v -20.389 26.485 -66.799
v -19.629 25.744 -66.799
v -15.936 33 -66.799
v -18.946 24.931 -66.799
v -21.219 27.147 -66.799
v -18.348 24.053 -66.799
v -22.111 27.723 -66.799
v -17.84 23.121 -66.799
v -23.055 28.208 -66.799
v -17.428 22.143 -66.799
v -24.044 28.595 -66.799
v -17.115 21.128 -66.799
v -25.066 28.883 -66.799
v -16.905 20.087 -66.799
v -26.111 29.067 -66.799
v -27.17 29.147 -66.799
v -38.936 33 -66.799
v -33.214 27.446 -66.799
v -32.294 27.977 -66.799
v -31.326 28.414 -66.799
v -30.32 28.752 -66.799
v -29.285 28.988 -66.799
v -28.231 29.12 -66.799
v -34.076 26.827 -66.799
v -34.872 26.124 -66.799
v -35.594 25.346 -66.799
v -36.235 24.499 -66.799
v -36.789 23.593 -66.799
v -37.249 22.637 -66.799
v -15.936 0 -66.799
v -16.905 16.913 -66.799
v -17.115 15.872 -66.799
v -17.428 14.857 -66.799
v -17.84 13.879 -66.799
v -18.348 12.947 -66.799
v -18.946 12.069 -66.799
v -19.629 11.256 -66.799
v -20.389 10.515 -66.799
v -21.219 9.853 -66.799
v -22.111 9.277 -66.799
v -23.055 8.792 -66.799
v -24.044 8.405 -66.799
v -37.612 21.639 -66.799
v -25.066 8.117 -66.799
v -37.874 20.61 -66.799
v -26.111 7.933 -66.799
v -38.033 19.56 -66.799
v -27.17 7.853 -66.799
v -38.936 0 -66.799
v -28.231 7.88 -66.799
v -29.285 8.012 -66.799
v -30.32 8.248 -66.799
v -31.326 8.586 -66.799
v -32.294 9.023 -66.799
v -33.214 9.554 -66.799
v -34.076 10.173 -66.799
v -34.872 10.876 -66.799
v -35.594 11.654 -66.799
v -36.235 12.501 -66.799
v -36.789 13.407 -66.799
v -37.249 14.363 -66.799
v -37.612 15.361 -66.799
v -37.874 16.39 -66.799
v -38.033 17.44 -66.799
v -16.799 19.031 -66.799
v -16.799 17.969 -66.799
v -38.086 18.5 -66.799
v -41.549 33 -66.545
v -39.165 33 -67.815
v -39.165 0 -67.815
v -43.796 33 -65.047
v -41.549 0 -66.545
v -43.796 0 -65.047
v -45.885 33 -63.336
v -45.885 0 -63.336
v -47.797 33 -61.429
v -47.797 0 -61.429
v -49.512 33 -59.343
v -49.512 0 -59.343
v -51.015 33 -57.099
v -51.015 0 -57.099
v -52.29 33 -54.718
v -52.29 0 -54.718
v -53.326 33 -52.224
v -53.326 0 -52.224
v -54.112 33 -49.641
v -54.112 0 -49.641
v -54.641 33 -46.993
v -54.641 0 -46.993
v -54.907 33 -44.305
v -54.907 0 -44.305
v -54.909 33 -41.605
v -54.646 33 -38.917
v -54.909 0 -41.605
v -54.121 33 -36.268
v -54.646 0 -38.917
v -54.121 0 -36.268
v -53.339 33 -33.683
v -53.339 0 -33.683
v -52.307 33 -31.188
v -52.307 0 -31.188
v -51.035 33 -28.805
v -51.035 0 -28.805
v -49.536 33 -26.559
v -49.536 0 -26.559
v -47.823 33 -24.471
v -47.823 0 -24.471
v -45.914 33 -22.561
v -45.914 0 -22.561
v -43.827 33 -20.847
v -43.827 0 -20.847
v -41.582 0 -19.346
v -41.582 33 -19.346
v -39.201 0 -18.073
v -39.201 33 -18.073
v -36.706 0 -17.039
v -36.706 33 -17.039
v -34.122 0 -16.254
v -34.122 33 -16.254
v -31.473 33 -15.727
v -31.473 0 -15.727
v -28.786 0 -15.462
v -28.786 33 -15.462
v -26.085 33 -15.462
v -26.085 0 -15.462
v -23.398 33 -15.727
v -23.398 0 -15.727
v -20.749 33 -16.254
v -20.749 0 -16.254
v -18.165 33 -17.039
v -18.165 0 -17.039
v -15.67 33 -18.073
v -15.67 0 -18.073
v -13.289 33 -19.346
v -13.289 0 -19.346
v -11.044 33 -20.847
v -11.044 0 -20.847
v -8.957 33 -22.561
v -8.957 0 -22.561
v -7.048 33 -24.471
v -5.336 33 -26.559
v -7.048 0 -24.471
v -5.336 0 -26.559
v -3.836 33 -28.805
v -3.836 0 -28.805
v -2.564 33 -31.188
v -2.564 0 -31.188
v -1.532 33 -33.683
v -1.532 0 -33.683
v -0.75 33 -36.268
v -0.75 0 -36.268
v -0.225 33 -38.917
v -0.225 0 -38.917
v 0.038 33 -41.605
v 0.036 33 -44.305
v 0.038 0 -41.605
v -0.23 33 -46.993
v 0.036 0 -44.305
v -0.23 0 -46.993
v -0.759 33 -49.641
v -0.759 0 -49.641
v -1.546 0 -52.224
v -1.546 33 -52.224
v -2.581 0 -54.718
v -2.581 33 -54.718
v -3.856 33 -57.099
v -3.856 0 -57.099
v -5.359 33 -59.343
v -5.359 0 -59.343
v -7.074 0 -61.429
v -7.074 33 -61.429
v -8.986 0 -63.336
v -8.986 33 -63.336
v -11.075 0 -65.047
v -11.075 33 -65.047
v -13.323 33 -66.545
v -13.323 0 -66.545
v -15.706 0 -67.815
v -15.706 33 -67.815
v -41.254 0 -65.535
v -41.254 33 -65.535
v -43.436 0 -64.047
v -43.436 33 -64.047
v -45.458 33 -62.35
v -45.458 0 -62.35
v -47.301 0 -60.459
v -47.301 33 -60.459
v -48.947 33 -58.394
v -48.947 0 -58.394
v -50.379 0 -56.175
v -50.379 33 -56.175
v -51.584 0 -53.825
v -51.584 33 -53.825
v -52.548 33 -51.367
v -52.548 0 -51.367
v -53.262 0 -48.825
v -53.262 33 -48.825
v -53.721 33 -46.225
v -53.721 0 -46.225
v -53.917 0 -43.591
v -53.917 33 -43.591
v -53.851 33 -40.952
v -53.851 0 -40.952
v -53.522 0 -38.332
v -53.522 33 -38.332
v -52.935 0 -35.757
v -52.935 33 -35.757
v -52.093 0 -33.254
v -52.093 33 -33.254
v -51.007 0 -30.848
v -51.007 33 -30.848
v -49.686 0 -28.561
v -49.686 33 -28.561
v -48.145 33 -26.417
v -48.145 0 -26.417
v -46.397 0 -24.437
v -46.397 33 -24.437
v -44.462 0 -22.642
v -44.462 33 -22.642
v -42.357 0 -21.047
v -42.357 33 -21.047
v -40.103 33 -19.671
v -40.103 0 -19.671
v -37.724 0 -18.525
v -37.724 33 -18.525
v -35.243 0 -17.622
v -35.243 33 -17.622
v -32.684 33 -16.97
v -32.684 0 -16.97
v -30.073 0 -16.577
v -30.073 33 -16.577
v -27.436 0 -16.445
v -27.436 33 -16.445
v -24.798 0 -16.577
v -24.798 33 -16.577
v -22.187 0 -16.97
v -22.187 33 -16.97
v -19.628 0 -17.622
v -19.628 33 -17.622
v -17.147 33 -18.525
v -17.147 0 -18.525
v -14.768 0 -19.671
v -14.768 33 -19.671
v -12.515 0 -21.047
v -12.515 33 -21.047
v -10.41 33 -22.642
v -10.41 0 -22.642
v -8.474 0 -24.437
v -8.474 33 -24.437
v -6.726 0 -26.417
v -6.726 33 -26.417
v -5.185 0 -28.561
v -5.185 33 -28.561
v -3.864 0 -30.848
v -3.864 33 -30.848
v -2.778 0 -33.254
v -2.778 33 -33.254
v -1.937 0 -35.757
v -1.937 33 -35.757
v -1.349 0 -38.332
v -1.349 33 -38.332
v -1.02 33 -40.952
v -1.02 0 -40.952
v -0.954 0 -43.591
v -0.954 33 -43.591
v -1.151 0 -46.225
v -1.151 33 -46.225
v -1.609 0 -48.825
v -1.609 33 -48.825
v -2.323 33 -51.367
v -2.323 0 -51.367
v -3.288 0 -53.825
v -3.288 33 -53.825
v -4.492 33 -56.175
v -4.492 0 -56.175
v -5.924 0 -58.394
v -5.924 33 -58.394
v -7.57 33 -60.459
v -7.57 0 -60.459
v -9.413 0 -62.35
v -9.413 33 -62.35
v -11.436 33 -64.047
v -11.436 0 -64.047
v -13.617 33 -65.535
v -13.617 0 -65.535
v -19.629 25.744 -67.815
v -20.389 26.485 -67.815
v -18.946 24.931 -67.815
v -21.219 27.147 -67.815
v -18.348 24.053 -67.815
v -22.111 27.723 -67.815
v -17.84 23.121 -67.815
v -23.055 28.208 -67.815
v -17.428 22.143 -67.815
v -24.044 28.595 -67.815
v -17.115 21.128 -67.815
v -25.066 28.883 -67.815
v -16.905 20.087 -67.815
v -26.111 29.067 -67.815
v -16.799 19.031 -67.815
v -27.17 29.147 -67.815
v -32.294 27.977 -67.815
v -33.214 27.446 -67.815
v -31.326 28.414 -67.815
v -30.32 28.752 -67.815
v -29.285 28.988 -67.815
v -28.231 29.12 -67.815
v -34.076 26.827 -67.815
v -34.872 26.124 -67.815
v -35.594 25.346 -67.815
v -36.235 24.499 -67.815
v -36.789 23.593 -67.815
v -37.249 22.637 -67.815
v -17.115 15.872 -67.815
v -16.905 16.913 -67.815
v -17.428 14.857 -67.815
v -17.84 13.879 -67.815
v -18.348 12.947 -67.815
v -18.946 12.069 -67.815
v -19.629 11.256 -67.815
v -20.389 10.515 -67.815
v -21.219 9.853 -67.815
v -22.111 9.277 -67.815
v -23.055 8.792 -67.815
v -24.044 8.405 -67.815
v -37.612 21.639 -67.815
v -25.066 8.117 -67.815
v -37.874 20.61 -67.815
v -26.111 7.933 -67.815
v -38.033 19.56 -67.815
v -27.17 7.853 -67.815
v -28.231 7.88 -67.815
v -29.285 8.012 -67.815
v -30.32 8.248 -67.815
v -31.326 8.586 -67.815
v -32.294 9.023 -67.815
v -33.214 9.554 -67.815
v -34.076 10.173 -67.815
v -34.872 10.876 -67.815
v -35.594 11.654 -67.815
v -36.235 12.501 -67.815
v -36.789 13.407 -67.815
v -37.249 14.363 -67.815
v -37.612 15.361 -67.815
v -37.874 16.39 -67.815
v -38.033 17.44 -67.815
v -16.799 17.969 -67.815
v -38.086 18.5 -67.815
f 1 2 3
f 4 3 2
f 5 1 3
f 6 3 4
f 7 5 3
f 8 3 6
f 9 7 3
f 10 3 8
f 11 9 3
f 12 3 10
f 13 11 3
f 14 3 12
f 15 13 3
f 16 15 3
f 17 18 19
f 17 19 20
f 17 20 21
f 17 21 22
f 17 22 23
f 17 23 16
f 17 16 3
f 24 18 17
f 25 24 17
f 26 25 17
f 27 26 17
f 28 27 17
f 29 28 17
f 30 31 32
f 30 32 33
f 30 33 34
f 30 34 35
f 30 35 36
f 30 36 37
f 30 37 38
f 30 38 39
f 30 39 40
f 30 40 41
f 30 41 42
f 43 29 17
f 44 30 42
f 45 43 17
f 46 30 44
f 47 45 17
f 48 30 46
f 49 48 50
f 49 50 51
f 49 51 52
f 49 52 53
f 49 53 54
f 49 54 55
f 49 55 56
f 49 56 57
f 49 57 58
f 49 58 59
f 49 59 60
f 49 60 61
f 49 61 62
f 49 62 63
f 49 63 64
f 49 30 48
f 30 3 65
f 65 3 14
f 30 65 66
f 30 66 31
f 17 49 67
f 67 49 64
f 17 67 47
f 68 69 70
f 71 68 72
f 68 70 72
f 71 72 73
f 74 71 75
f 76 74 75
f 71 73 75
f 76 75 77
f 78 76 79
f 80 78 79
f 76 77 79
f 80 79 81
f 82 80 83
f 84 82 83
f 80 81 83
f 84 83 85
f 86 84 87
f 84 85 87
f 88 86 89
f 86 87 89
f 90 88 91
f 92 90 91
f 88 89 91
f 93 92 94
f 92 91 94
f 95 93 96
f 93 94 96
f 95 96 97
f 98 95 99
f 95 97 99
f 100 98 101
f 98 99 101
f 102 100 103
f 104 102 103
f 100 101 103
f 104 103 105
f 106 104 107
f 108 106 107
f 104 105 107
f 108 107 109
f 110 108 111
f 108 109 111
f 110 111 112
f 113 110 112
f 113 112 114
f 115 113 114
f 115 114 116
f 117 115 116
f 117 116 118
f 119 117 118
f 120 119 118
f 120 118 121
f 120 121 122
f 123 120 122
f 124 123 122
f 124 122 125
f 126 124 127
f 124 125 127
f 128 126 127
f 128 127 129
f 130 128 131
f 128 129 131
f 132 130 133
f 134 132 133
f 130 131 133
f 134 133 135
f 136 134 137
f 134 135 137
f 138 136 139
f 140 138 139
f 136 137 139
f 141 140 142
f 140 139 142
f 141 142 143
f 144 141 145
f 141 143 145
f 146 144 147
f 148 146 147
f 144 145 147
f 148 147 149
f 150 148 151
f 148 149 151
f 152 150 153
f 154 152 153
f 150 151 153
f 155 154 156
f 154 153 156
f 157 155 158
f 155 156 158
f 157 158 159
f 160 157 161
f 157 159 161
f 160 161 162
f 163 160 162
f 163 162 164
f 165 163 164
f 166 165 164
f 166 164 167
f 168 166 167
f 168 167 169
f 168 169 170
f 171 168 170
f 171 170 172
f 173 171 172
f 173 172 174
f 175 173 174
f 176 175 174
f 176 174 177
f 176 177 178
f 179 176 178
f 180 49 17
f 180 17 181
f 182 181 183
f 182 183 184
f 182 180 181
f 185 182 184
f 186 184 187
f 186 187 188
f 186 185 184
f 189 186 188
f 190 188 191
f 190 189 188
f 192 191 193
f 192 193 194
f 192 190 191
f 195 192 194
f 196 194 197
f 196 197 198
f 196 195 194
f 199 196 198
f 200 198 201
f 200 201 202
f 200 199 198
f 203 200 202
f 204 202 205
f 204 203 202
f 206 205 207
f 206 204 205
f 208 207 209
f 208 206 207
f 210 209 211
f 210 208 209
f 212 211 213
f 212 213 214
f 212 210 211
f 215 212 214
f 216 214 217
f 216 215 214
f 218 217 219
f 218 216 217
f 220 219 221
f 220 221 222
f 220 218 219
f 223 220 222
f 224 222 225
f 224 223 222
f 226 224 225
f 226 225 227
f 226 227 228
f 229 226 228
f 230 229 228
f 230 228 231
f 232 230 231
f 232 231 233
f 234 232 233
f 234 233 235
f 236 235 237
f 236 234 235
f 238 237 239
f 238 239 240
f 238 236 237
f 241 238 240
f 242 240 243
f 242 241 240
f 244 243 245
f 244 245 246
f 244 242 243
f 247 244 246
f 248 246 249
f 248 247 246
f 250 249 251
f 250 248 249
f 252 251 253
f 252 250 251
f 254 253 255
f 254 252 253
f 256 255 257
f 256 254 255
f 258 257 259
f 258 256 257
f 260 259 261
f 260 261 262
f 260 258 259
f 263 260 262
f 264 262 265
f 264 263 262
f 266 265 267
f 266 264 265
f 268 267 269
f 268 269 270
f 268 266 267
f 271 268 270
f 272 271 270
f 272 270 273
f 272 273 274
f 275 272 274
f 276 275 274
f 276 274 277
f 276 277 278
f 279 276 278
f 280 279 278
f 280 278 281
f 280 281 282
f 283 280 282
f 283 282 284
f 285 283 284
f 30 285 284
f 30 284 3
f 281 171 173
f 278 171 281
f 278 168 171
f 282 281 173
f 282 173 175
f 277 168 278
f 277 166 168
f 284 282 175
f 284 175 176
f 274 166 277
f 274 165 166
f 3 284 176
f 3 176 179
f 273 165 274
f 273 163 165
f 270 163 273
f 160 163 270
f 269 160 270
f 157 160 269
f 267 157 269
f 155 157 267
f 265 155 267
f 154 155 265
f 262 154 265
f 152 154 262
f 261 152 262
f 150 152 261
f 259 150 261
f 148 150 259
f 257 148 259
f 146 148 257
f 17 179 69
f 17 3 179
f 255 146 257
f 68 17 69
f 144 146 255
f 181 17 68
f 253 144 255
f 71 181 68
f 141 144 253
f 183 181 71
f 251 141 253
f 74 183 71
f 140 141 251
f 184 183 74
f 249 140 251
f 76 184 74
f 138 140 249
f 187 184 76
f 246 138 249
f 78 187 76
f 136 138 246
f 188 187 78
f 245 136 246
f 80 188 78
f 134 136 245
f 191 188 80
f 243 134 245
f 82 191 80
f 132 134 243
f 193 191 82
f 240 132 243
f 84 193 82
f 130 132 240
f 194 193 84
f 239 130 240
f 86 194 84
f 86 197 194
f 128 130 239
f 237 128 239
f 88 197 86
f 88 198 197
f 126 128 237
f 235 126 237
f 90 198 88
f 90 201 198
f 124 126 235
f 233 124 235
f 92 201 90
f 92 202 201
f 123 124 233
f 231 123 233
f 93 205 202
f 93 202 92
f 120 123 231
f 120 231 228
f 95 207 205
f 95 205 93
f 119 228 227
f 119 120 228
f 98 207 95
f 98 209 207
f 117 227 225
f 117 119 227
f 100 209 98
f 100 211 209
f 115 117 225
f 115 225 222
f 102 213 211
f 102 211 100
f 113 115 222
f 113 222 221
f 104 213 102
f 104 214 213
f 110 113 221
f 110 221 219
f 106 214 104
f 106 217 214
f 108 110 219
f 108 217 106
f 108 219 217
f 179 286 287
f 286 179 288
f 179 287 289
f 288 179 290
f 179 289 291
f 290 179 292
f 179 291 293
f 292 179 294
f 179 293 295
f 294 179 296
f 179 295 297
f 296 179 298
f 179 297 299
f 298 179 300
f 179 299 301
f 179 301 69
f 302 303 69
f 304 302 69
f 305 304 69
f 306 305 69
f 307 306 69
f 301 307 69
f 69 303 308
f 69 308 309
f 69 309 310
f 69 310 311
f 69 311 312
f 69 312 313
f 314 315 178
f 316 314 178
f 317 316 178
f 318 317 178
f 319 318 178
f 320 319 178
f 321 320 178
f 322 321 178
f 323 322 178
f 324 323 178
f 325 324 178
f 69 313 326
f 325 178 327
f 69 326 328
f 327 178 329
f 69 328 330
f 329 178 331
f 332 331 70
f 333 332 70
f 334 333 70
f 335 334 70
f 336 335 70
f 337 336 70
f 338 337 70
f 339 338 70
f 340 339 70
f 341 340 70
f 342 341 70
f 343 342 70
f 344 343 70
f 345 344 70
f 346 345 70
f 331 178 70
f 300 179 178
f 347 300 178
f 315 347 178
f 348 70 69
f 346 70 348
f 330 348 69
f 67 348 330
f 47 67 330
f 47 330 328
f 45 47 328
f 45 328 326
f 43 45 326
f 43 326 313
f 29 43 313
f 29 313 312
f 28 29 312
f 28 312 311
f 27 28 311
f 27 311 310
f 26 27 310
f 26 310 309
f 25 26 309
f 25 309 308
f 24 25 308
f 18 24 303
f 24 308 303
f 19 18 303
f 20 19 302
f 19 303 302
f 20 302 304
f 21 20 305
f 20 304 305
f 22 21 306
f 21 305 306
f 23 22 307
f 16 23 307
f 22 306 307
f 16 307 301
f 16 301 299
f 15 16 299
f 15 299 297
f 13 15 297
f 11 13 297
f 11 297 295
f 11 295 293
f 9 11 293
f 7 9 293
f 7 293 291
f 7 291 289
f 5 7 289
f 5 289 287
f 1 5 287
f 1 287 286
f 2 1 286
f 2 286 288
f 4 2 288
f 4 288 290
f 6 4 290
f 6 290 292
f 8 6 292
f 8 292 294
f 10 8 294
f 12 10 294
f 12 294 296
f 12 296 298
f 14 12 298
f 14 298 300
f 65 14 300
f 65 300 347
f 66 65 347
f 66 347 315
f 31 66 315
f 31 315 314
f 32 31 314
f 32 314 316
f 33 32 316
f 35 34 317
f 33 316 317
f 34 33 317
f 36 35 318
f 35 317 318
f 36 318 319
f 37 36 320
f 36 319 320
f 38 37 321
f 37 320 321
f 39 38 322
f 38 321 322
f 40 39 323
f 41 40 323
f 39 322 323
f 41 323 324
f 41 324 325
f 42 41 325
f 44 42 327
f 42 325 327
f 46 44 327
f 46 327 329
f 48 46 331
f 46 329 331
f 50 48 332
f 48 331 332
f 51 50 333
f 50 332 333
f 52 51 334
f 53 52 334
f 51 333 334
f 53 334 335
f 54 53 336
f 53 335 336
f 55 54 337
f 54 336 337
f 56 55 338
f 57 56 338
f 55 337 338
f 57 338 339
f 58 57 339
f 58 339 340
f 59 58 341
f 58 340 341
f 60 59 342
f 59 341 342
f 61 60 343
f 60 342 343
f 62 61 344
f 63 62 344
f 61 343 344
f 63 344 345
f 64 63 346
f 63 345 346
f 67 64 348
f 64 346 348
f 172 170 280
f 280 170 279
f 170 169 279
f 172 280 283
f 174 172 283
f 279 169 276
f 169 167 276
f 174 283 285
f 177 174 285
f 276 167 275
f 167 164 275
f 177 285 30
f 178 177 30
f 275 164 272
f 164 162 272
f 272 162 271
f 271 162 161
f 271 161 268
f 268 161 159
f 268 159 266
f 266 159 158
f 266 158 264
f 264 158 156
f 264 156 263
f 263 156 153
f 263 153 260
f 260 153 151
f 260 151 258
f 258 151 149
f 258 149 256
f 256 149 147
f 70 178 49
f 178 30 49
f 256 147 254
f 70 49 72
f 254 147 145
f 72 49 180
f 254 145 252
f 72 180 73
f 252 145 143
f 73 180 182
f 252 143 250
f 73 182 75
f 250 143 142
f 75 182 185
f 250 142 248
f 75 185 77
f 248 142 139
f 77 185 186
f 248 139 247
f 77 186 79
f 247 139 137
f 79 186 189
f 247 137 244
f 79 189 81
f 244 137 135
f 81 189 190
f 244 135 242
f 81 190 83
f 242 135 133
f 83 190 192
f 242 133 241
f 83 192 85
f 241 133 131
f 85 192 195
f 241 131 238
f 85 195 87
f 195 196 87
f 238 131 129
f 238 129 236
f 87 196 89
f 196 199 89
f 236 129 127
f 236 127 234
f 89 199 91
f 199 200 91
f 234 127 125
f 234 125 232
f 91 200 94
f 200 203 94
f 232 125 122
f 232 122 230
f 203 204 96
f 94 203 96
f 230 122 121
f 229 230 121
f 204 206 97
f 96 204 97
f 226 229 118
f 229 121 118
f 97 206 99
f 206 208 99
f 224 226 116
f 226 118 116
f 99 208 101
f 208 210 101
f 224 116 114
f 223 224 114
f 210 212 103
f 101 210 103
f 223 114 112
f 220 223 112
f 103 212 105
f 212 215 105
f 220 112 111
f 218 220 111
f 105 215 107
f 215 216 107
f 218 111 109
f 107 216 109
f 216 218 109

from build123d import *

# Parameters (mm, degrees)
BOSS_EXTRUDE1_DEPTH = 33
SKETCH2_R           = 10.65
CUT_EXTRUDE1_DEPTH  = 10


with BuildPart() as part:
    # Sketch1 → Boss-Extrude1 (new body)
    with BuildSketch(Plane(origin=(0, 0, 0), x_dir=(-1, 0, 0), z_dir=(0, 1, 0))):
        with BuildLine():
            Line((15.705832049, -67.814850439), (39.165320565, -67.814850439))
            ThreePointArc((39.165320565, -67.814850439), (27.435576307, -15.429277781), (15.705832049, -67.814850439))
        make_face()
        with BuildLine():
            Line((15.935576307, -66.798850439), (38.935576307, -66.798850439))
            ThreePointArc((38.935576307, -66.798850439), (27.435576307, -16.445277781), (15.935576307, -66.798850439))
        make_face(mode=Mode.SUBTRACT)
    extrude(amount=BOSS_EXTRUDE1_DEPTH)

    # Sketch2 → Cut-Extrude1 (cut)
    with BuildSketch(Plane(origin=(0, 0, -67.814850439), x_dir=(-1, 0, 0), z_dir=(0, 0, -1))):
        with Locations((27.435576307, 18.5)):
            Circle(SKETCH2_R)
    extrude(amount=-CUT_EXTRUDE1_DEPTH, mode=Mode.SUBTRACT)


solid = part.part
